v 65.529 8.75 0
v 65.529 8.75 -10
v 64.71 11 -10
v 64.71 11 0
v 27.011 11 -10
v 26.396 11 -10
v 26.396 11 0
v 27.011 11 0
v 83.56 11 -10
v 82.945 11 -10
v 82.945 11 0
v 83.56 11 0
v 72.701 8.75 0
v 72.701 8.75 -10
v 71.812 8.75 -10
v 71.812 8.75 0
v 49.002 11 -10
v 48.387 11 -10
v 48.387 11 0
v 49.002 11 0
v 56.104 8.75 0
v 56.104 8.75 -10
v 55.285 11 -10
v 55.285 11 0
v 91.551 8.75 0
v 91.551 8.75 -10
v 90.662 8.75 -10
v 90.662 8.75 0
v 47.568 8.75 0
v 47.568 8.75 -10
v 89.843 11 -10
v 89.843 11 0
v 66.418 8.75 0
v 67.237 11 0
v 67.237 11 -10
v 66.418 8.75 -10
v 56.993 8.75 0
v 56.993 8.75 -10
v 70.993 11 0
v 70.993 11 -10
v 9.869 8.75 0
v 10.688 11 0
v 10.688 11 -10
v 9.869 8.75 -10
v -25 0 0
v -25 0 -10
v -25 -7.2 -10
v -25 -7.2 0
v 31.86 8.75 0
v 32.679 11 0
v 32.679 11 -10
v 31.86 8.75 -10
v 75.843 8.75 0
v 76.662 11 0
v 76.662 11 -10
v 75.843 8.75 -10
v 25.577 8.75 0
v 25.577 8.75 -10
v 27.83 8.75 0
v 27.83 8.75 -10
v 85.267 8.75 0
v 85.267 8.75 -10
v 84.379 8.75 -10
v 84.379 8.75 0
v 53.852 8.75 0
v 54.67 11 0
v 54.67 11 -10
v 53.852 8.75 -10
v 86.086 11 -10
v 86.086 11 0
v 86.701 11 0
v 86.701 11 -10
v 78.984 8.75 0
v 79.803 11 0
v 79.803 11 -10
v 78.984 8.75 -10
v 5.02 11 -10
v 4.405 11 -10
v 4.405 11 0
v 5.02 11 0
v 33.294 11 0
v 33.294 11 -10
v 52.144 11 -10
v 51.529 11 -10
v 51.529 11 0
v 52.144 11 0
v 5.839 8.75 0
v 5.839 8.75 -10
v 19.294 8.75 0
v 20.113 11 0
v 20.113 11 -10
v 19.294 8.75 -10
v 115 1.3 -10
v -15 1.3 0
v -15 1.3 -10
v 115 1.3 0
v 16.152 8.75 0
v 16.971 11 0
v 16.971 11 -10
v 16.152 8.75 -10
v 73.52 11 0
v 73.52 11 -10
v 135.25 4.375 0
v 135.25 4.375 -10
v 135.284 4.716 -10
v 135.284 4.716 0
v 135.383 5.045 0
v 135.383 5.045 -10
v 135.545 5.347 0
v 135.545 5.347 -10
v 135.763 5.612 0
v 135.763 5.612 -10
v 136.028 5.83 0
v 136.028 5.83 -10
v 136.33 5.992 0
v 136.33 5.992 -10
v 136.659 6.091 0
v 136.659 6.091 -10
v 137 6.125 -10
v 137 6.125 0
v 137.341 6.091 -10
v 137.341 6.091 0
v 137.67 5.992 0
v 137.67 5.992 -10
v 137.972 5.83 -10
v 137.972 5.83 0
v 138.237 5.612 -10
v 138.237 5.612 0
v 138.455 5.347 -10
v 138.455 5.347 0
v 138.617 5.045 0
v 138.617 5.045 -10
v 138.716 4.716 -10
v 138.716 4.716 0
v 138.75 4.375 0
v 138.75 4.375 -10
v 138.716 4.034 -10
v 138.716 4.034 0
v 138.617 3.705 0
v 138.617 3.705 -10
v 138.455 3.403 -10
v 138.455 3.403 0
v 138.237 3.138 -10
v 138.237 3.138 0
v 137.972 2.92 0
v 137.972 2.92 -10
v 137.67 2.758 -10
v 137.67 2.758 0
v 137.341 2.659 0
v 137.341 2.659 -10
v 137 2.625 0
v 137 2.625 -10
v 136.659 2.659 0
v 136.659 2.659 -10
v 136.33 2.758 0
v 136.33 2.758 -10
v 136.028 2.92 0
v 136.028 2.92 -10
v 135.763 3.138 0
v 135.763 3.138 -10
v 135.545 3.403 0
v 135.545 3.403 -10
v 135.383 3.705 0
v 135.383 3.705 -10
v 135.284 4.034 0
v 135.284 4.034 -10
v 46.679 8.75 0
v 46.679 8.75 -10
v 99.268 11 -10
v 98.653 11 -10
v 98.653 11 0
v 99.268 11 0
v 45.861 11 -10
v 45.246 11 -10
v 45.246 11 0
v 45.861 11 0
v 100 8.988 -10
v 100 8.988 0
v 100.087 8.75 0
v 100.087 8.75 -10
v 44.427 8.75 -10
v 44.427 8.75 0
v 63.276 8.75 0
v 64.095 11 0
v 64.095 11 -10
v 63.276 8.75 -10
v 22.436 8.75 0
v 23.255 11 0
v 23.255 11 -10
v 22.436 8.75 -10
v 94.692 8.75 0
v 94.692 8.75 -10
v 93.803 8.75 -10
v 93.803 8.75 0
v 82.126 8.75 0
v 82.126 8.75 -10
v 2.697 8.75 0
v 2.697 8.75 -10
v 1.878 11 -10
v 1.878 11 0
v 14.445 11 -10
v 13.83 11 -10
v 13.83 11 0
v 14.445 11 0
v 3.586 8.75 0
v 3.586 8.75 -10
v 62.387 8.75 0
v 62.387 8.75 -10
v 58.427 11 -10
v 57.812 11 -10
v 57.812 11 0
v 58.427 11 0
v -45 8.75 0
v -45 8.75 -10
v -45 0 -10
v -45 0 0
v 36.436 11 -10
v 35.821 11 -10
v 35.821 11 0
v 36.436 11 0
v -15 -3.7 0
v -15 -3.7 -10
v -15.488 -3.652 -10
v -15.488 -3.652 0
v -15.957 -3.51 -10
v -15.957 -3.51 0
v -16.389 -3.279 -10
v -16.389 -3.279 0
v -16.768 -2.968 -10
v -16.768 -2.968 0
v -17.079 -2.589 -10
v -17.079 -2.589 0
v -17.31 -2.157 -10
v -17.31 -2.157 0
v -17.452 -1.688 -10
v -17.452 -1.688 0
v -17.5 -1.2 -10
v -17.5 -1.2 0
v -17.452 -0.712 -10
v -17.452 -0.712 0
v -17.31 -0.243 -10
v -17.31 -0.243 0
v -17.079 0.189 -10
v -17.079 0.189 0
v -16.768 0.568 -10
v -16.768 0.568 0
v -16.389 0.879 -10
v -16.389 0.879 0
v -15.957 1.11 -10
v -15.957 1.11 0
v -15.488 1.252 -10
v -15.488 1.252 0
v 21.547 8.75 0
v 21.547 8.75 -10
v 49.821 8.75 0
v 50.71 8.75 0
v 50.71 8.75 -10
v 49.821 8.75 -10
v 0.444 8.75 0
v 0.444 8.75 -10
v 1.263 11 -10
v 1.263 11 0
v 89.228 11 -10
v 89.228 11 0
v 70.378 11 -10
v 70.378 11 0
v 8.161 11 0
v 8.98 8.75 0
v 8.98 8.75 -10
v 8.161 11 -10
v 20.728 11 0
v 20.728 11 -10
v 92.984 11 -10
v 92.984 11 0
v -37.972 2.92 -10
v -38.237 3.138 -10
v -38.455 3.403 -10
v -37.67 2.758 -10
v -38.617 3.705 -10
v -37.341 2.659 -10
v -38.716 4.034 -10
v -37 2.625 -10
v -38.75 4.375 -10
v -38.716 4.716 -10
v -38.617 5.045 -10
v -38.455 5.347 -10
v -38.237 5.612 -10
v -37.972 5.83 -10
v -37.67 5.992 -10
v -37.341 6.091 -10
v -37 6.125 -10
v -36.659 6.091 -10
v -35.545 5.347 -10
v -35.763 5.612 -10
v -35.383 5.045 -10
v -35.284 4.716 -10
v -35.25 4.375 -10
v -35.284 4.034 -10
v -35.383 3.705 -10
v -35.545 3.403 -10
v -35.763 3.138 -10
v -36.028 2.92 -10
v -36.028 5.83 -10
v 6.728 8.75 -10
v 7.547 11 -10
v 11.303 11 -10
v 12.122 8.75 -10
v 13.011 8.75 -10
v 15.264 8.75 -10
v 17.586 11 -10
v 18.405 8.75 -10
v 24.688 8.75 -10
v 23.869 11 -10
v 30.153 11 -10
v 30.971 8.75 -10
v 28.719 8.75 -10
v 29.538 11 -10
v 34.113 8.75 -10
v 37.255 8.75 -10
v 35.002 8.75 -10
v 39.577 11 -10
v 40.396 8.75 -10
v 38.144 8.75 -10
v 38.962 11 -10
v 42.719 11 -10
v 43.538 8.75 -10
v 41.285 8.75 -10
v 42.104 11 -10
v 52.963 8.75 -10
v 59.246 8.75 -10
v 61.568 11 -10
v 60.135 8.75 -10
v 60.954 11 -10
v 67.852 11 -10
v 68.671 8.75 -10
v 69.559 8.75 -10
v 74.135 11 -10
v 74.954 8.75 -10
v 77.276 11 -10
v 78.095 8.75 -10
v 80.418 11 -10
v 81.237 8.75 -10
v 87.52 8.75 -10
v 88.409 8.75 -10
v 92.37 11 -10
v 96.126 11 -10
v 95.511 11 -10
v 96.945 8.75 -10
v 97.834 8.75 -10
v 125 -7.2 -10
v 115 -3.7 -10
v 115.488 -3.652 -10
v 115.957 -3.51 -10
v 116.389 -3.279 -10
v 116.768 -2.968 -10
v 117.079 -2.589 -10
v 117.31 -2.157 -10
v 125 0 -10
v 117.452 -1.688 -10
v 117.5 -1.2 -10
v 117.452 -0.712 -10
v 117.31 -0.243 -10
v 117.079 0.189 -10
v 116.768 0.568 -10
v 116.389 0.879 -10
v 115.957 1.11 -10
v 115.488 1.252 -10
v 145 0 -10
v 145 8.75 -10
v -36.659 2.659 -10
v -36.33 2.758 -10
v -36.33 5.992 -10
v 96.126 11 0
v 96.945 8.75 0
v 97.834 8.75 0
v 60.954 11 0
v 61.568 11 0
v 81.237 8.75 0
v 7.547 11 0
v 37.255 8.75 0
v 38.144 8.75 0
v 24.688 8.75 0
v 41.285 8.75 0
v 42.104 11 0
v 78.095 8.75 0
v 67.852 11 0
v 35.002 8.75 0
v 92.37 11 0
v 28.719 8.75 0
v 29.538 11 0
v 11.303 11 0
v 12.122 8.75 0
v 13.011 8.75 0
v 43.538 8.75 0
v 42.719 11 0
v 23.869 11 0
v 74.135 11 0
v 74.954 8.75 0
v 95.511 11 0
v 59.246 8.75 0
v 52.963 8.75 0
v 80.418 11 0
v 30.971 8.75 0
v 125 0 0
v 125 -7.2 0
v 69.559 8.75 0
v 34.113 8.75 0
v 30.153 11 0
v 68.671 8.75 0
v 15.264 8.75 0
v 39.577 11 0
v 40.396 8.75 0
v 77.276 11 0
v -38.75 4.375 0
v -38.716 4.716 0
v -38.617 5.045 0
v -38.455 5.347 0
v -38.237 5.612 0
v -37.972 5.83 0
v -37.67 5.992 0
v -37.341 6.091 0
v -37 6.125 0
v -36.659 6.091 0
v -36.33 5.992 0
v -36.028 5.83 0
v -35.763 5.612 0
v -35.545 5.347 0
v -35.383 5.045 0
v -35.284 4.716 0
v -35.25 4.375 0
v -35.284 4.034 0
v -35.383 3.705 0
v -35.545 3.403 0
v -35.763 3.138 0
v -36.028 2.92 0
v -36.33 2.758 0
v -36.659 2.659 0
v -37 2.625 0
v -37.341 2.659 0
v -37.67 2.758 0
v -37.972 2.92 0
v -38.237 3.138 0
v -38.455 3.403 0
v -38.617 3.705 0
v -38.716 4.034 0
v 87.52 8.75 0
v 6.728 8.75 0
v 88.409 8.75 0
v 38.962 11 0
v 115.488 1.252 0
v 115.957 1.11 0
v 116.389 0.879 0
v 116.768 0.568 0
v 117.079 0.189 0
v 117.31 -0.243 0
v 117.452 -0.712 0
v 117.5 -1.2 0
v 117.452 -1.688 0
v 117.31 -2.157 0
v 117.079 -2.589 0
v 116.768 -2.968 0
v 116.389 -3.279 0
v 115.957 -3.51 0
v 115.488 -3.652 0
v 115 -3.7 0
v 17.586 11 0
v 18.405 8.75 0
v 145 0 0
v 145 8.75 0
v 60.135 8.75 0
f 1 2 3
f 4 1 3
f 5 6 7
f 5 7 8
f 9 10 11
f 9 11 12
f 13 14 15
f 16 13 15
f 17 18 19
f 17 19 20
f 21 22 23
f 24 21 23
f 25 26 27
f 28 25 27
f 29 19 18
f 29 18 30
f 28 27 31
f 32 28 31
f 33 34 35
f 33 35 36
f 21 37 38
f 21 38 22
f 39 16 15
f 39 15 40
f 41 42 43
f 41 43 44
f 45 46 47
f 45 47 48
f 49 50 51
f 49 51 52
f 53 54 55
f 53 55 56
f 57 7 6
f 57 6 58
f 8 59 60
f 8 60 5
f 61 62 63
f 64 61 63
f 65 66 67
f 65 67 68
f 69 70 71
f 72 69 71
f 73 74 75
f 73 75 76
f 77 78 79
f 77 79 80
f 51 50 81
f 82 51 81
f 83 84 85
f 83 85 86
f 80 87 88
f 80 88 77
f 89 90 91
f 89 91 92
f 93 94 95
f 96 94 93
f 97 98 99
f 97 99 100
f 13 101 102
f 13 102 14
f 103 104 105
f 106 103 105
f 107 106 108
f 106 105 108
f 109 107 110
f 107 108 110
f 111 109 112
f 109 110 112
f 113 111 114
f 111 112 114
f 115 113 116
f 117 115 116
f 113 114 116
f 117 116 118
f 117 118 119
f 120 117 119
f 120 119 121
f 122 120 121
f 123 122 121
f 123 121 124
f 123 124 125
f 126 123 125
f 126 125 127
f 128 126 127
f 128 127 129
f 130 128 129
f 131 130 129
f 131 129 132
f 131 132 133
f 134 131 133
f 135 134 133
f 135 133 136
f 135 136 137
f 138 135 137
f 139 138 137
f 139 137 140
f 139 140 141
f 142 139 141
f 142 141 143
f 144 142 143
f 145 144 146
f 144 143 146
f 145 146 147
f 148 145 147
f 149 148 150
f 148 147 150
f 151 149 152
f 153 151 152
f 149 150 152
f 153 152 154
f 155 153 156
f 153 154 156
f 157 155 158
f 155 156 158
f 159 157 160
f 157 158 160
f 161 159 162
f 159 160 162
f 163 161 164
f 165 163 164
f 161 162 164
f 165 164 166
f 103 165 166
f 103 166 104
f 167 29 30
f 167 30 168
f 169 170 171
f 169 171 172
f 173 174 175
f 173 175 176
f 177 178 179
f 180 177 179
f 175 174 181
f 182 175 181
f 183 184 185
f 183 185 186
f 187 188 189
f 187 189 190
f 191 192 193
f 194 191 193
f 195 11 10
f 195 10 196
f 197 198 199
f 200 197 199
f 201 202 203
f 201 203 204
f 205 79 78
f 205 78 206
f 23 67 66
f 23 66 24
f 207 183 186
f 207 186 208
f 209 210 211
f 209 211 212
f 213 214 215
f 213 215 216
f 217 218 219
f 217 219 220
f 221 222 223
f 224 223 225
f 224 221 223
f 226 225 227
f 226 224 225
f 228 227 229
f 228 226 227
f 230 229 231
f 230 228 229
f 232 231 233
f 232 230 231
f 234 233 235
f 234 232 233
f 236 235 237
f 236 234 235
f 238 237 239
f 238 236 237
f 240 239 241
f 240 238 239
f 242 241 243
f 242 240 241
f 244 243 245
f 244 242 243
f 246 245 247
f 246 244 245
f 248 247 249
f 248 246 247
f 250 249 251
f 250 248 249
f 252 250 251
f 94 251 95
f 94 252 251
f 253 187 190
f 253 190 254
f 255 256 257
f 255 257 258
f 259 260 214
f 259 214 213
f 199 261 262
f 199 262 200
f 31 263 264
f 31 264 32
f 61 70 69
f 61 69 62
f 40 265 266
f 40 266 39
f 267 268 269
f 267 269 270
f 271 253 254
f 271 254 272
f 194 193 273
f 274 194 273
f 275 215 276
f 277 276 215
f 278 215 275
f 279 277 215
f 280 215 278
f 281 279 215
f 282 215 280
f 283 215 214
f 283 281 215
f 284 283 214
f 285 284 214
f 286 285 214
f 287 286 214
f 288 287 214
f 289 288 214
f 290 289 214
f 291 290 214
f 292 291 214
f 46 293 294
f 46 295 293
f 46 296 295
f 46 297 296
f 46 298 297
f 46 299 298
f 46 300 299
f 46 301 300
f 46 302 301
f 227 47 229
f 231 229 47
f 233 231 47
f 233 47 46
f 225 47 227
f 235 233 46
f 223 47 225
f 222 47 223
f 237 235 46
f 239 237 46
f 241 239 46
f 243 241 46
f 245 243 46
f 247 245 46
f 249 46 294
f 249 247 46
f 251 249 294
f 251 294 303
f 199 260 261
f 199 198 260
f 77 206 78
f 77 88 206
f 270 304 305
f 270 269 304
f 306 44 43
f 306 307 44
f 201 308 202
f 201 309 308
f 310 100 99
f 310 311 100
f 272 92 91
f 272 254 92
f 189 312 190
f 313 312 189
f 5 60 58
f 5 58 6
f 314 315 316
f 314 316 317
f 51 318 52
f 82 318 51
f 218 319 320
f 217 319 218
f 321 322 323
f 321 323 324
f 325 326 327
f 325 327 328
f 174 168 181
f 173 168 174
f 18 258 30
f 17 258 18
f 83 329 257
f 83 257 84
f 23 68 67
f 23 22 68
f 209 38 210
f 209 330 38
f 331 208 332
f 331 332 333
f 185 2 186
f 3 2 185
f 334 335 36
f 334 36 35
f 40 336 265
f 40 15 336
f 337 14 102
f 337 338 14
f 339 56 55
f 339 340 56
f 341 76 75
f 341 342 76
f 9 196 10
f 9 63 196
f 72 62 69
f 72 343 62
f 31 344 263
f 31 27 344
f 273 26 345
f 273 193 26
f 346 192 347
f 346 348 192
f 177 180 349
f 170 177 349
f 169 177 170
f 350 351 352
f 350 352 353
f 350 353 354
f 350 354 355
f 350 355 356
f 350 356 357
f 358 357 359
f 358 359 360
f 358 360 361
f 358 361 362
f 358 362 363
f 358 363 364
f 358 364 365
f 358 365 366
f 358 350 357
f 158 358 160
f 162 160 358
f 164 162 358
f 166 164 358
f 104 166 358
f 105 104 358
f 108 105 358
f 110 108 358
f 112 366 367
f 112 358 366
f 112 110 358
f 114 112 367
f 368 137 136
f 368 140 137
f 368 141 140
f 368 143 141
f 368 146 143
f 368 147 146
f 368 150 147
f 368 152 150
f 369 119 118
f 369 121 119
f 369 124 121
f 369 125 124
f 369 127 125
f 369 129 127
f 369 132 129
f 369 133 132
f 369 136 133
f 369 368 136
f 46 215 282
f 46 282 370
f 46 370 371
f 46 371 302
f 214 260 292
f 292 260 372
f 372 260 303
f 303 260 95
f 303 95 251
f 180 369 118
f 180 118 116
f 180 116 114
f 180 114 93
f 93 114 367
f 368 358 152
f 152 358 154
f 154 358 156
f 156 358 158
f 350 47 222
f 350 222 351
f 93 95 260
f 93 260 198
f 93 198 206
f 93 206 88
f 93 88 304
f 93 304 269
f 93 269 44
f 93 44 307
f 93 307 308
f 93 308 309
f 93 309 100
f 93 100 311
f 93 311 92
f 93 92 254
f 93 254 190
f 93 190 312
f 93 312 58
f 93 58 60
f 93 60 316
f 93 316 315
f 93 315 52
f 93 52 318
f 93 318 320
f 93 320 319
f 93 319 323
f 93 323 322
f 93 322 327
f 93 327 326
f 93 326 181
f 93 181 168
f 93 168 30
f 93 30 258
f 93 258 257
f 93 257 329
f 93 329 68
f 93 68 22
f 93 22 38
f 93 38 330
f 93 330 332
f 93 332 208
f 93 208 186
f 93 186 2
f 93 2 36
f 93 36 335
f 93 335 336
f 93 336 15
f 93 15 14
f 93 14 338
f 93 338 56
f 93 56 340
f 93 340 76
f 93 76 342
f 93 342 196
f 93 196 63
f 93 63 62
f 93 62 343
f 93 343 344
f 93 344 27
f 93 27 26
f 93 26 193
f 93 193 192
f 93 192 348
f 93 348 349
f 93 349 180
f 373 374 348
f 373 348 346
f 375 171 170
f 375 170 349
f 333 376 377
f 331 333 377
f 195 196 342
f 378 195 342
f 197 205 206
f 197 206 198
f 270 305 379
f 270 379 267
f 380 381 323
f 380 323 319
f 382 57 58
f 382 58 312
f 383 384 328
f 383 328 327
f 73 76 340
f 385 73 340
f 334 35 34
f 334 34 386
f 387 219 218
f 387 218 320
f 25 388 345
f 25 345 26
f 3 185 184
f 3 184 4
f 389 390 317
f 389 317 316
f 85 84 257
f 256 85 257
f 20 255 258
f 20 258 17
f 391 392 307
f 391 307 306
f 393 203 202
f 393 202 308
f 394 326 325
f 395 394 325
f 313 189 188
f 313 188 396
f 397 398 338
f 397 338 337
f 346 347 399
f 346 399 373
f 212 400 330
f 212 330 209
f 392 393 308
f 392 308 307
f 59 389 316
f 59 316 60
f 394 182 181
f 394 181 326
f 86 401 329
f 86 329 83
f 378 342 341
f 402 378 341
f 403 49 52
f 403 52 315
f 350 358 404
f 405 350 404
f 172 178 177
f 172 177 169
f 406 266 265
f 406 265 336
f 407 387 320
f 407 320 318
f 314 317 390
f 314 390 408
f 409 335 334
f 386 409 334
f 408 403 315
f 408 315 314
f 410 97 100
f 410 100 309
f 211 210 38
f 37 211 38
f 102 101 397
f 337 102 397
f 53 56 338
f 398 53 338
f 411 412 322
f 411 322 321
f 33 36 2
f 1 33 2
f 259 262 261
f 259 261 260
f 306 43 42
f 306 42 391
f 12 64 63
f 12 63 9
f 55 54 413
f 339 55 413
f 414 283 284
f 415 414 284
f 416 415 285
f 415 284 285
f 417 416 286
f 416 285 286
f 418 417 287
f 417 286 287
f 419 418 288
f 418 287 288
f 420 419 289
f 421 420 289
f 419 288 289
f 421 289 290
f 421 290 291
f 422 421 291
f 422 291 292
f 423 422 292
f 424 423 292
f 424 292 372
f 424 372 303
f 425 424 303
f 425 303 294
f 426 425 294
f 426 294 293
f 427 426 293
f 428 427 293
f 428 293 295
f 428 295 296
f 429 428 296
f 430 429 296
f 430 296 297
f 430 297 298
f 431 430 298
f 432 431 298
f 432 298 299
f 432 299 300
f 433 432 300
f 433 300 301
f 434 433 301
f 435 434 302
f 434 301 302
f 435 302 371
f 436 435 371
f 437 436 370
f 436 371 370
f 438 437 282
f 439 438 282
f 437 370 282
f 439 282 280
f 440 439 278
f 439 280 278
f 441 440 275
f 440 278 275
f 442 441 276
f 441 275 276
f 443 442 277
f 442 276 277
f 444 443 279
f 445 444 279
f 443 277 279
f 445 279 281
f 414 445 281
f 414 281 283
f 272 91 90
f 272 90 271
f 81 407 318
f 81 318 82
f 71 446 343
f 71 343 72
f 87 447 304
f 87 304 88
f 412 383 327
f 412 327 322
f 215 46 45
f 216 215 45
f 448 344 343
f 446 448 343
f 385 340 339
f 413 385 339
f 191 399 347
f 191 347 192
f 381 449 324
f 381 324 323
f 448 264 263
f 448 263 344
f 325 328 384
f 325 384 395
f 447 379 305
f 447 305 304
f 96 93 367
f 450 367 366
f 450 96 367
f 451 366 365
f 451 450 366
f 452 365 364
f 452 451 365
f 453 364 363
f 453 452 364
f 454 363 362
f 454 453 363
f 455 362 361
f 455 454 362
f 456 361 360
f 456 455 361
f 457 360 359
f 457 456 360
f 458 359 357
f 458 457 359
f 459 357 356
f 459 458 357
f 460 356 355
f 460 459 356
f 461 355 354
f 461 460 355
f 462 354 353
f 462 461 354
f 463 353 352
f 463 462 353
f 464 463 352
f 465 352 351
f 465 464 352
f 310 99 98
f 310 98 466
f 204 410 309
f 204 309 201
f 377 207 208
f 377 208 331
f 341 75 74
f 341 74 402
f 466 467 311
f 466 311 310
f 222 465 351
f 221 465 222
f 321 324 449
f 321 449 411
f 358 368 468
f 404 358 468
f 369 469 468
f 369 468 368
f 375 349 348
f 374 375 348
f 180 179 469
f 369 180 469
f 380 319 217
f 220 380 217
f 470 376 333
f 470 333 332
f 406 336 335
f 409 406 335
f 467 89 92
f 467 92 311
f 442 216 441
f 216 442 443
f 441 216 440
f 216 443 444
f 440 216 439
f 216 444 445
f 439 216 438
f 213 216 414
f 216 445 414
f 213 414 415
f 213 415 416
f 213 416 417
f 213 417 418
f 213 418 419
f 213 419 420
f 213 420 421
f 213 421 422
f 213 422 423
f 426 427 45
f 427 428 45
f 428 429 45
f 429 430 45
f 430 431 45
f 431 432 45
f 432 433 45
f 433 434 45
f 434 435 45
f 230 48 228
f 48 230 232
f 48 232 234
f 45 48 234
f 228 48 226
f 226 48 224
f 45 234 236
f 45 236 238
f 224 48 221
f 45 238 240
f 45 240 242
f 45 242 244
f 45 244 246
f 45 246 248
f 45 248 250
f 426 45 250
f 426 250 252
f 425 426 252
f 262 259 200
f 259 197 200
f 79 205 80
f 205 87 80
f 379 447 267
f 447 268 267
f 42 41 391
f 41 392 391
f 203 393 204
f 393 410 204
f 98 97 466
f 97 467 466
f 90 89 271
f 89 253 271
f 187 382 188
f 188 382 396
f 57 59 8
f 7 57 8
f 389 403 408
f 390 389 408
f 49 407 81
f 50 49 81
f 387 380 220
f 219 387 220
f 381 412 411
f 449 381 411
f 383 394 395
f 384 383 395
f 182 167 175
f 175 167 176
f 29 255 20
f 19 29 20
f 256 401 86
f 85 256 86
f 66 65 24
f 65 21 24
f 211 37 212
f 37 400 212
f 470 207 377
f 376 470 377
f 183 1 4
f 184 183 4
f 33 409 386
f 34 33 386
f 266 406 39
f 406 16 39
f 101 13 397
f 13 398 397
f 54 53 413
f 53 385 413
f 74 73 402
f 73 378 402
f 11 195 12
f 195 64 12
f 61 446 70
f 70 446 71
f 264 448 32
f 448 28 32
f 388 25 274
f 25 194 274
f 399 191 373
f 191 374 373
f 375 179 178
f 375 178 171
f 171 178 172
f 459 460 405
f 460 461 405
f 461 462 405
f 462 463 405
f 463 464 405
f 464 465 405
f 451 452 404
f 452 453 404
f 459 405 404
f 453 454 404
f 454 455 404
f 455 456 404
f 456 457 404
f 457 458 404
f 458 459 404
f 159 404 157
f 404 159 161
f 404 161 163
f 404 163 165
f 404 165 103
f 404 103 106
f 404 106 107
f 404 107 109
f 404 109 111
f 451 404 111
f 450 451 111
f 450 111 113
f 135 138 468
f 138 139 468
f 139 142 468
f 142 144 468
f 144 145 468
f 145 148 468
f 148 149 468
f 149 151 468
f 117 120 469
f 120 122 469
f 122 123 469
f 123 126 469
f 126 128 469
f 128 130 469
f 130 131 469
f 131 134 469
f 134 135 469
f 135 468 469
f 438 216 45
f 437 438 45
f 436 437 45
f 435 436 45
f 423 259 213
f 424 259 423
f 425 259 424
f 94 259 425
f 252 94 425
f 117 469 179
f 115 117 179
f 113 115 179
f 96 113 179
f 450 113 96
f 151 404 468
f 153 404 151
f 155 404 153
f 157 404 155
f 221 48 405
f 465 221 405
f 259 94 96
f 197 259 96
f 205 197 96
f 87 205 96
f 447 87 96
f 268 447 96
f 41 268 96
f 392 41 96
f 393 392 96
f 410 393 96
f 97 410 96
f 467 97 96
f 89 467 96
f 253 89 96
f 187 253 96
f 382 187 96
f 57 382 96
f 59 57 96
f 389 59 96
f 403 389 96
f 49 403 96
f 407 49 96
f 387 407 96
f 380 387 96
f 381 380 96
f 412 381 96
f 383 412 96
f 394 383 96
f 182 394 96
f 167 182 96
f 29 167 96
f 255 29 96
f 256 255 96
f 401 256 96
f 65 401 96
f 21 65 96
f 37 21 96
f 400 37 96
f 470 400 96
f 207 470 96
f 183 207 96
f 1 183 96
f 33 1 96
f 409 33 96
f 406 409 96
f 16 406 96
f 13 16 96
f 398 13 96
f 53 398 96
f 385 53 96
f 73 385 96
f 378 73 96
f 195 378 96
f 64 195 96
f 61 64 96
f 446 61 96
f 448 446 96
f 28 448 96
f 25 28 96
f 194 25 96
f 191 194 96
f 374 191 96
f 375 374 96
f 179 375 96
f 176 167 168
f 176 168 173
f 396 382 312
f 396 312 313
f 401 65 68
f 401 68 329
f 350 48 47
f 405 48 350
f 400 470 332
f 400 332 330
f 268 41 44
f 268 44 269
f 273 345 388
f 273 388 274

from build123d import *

# Parameters (mm, degrees)
BLANKSKE_W          = 100
BLANKSKE_H          = 11
BLANK_DEPTH         = 10
TOOTHCUTSIM_DEPTH   = 102.098961419
TEETHCUTS_COUNT     = 33
TEETHCUTS_PITCH     = 3.14159265
SKETCH1_W           = 10
SKETCH1_H           = 8.987737656
BOSS_EXTRUDE1_DEPTH = 45
SKETCH2_W           = 10
SKETCH2_H           = 8.75
BOSS_EXTRUDE2_DEPTH = 45
SKETCH3_R           = 1.75
CUT_EXTRUDE1_DEPTH  = 146.760076839
SKETCH4_W           = 150
SKETCH4_H           = 10
BOSS_EXTRUDE3_DEPTH = 7.2
CUT_EXTRUDE2_DEPTH  = 146.760076839
CUT_EXTRUDE3_DEPTH  = 146.760076839


with BuildPart() as part:
    # BlankSke → Blank (new body)
    with BuildSketch(Plane.XY):
        with Locations((50, 5.5)):
            Rectangle(BLANKSKE_W, BLANKSKE_H)
    extrude(amount=-BLANK_DEPTH)

    # TooCutSkeSim → ToothCutSim (cut, through all)
    with BuildSketch(Plane.XY):
        Polygon((0.44443537, 8.75), (-0.44443537, 8.75), (-1.272613241, 11.0254), (1.272613241, 11.0254), align=None)
    toothcutsim = extrude(amount=-TOOTHCUTSIM_DEPTH, mode=Mode.SUBTRACT)

    # TeethCuts: ToothCutSim ×33
    with Locations(*[(i * TEETHCUTS_PITCH, 0, 0) for i in range(1, TEETHCUTS_COUNT)]):
        add(toothcutsim, mode=Mode.SUBTRACT)

    # Sketch1 → Boss-Extrude1 (add)
    with BuildSketch(Plane(origin=(100, 0, 0), x_dir=(0, 0, -1), z_dir=(1, 0, 0))):
        with Locations((5, 4.493868828)):
            Rectangle(SKETCH1_W, SKETCH1_H)
    extrude(amount=BOSS_EXTRUDE1_DEPTH)

    # Sketch2 → Boss-Extrude2 (add)
    with BuildSketch(Plane.ZY):
        with Locations((-5, 4.375)):
            Rectangle(SKETCH2_W, SKETCH2_H)
    extrude(amount=BOSS_EXTRUDE2_DEPTH)

    # Sketch3 → Cut-Extrude1 (cut, through all)
    with BuildSketch(Plane(origin=(0, 0, -10), x_dir=(-1, 0, 0), z_dir=(0, 0, -1))):
        with Locations((-137, 4.375)):
            Circle(SKETCH3_R)
        with Locations((37, 4.375)):
            Circle(SKETCH3_R)
    extrude(amount=-CUT_EXTRUDE1_DEPTH, mode=Mode.SUBTRACT)

    # Sketch4 → Boss-Extrude3 (add)
    with BuildSketch(Plane.XZ):
        with Locations((50, -5)):
            Rectangle(SKETCH4_W, SKETCH4_H)
    extrude(amount=BOSS_EXTRUDE3_DEPTH)

    # Sketch5 → Cut-Extrude2 (cut, through all)
    with BuildSketch(Plane.XY):
        with BuildLine():
            Line((-15, 1.3), (115, 1.3))
            ThreePointArc((115, 1.3), (117.5, -1.2), (115, -3.7))
            Line((115, -3.7), (-15, -3.7))
            ThreePointArc((-15, -3.7), (-17.5, -1.2), (-15, 1.3))
        make_face()
    extrude(amount=-CUT_EXTRUDE2_DEPTH, mode=Mode.SUBTRACT)

    # Sketch6 → Cut-Extrude3 (cut, through all)
    with BuildSketch(Plane.XY):
        Polygon((100, 8.987737656), (100.08652943, 8.75), (145, 8.75), (145, 8.987737656), align=None)
    extrude(amount=-CUT_EXTRUDE3_DEPTH, mode=Mode.SUBTRACT)


solid = part.part
